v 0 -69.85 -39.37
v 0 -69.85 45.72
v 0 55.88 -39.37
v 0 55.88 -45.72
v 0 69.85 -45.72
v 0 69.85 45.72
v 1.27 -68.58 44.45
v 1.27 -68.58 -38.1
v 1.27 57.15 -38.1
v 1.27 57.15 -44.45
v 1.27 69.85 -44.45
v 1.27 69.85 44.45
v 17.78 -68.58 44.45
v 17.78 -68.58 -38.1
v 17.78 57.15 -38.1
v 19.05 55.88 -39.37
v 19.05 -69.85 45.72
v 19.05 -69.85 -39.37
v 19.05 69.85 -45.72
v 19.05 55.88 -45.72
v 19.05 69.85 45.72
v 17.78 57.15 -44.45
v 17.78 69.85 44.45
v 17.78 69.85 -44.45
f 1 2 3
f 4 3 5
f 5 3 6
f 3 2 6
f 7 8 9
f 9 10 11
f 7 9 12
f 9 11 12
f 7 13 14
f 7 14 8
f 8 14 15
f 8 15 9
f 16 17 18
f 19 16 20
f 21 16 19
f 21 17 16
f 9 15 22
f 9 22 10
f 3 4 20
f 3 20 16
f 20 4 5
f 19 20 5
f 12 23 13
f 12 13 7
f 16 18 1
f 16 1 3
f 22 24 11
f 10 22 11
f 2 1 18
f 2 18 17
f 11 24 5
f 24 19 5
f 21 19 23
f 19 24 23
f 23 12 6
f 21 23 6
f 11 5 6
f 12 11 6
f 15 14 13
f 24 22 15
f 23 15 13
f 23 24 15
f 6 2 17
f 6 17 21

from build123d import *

# Parameters (mm, degrees)
F0_W     = 139.7
F0_H     = 91.44
F1_DEPTH = 19.05
F2_W     = 125.73
F2_H     = 6.35
F3_DEPTH = 25.4
F4_W     = 16.51
F4_H     = 88.9
F5_DEPTH = 12.7
F6_W     = 16.51
F6_H     = 82.55
F7_DEPTH = 125.73


with BuildPart() as f1:
    # F0 (on Right) → F1 (new body)
    with BuildSketch(Plane.YZ):
        Rectangle(F0_W, F0_H)
    extrude(amount=F1_DEPTH)

    # F2 (on face) → F3 (cut)
    with BuildSketch(Plane.YZ.offset(19.05)):
        with Locations((-6.985, -42.545)):
            Rectangle(F2_W, F2_H)
    extrude(amount=-F3_DEPTH, mode=Mode.SUBTRACT)

    # F4 (on face) → F5 (cut)
    with BuildSketch(Plane(origin=(0, 69.85, 0), x_dir=(-1, 0, 0), z_dir=(0, 1, 0))):
        with Locations((-9.525, 0)):
            Rectangle(F4_W, F4_H)
    extrude(amount=-F5_DEPTH, mode=Mode.SUBTRACT)

    # F6 (on face) → F7 (cut)
    with BuildSketch(Plane(origin=(0, 57.15, 0), x_dir=(-1, 0, 0), z_dir=(0, 1, 0))):
        with Locations((-9.525, 3.175)):
            Rectangle(F6_W, F6_H)
    extrude(amount=-F7_DEPTH, mode=Mode.SUBTRACT)


solid = f1.part
